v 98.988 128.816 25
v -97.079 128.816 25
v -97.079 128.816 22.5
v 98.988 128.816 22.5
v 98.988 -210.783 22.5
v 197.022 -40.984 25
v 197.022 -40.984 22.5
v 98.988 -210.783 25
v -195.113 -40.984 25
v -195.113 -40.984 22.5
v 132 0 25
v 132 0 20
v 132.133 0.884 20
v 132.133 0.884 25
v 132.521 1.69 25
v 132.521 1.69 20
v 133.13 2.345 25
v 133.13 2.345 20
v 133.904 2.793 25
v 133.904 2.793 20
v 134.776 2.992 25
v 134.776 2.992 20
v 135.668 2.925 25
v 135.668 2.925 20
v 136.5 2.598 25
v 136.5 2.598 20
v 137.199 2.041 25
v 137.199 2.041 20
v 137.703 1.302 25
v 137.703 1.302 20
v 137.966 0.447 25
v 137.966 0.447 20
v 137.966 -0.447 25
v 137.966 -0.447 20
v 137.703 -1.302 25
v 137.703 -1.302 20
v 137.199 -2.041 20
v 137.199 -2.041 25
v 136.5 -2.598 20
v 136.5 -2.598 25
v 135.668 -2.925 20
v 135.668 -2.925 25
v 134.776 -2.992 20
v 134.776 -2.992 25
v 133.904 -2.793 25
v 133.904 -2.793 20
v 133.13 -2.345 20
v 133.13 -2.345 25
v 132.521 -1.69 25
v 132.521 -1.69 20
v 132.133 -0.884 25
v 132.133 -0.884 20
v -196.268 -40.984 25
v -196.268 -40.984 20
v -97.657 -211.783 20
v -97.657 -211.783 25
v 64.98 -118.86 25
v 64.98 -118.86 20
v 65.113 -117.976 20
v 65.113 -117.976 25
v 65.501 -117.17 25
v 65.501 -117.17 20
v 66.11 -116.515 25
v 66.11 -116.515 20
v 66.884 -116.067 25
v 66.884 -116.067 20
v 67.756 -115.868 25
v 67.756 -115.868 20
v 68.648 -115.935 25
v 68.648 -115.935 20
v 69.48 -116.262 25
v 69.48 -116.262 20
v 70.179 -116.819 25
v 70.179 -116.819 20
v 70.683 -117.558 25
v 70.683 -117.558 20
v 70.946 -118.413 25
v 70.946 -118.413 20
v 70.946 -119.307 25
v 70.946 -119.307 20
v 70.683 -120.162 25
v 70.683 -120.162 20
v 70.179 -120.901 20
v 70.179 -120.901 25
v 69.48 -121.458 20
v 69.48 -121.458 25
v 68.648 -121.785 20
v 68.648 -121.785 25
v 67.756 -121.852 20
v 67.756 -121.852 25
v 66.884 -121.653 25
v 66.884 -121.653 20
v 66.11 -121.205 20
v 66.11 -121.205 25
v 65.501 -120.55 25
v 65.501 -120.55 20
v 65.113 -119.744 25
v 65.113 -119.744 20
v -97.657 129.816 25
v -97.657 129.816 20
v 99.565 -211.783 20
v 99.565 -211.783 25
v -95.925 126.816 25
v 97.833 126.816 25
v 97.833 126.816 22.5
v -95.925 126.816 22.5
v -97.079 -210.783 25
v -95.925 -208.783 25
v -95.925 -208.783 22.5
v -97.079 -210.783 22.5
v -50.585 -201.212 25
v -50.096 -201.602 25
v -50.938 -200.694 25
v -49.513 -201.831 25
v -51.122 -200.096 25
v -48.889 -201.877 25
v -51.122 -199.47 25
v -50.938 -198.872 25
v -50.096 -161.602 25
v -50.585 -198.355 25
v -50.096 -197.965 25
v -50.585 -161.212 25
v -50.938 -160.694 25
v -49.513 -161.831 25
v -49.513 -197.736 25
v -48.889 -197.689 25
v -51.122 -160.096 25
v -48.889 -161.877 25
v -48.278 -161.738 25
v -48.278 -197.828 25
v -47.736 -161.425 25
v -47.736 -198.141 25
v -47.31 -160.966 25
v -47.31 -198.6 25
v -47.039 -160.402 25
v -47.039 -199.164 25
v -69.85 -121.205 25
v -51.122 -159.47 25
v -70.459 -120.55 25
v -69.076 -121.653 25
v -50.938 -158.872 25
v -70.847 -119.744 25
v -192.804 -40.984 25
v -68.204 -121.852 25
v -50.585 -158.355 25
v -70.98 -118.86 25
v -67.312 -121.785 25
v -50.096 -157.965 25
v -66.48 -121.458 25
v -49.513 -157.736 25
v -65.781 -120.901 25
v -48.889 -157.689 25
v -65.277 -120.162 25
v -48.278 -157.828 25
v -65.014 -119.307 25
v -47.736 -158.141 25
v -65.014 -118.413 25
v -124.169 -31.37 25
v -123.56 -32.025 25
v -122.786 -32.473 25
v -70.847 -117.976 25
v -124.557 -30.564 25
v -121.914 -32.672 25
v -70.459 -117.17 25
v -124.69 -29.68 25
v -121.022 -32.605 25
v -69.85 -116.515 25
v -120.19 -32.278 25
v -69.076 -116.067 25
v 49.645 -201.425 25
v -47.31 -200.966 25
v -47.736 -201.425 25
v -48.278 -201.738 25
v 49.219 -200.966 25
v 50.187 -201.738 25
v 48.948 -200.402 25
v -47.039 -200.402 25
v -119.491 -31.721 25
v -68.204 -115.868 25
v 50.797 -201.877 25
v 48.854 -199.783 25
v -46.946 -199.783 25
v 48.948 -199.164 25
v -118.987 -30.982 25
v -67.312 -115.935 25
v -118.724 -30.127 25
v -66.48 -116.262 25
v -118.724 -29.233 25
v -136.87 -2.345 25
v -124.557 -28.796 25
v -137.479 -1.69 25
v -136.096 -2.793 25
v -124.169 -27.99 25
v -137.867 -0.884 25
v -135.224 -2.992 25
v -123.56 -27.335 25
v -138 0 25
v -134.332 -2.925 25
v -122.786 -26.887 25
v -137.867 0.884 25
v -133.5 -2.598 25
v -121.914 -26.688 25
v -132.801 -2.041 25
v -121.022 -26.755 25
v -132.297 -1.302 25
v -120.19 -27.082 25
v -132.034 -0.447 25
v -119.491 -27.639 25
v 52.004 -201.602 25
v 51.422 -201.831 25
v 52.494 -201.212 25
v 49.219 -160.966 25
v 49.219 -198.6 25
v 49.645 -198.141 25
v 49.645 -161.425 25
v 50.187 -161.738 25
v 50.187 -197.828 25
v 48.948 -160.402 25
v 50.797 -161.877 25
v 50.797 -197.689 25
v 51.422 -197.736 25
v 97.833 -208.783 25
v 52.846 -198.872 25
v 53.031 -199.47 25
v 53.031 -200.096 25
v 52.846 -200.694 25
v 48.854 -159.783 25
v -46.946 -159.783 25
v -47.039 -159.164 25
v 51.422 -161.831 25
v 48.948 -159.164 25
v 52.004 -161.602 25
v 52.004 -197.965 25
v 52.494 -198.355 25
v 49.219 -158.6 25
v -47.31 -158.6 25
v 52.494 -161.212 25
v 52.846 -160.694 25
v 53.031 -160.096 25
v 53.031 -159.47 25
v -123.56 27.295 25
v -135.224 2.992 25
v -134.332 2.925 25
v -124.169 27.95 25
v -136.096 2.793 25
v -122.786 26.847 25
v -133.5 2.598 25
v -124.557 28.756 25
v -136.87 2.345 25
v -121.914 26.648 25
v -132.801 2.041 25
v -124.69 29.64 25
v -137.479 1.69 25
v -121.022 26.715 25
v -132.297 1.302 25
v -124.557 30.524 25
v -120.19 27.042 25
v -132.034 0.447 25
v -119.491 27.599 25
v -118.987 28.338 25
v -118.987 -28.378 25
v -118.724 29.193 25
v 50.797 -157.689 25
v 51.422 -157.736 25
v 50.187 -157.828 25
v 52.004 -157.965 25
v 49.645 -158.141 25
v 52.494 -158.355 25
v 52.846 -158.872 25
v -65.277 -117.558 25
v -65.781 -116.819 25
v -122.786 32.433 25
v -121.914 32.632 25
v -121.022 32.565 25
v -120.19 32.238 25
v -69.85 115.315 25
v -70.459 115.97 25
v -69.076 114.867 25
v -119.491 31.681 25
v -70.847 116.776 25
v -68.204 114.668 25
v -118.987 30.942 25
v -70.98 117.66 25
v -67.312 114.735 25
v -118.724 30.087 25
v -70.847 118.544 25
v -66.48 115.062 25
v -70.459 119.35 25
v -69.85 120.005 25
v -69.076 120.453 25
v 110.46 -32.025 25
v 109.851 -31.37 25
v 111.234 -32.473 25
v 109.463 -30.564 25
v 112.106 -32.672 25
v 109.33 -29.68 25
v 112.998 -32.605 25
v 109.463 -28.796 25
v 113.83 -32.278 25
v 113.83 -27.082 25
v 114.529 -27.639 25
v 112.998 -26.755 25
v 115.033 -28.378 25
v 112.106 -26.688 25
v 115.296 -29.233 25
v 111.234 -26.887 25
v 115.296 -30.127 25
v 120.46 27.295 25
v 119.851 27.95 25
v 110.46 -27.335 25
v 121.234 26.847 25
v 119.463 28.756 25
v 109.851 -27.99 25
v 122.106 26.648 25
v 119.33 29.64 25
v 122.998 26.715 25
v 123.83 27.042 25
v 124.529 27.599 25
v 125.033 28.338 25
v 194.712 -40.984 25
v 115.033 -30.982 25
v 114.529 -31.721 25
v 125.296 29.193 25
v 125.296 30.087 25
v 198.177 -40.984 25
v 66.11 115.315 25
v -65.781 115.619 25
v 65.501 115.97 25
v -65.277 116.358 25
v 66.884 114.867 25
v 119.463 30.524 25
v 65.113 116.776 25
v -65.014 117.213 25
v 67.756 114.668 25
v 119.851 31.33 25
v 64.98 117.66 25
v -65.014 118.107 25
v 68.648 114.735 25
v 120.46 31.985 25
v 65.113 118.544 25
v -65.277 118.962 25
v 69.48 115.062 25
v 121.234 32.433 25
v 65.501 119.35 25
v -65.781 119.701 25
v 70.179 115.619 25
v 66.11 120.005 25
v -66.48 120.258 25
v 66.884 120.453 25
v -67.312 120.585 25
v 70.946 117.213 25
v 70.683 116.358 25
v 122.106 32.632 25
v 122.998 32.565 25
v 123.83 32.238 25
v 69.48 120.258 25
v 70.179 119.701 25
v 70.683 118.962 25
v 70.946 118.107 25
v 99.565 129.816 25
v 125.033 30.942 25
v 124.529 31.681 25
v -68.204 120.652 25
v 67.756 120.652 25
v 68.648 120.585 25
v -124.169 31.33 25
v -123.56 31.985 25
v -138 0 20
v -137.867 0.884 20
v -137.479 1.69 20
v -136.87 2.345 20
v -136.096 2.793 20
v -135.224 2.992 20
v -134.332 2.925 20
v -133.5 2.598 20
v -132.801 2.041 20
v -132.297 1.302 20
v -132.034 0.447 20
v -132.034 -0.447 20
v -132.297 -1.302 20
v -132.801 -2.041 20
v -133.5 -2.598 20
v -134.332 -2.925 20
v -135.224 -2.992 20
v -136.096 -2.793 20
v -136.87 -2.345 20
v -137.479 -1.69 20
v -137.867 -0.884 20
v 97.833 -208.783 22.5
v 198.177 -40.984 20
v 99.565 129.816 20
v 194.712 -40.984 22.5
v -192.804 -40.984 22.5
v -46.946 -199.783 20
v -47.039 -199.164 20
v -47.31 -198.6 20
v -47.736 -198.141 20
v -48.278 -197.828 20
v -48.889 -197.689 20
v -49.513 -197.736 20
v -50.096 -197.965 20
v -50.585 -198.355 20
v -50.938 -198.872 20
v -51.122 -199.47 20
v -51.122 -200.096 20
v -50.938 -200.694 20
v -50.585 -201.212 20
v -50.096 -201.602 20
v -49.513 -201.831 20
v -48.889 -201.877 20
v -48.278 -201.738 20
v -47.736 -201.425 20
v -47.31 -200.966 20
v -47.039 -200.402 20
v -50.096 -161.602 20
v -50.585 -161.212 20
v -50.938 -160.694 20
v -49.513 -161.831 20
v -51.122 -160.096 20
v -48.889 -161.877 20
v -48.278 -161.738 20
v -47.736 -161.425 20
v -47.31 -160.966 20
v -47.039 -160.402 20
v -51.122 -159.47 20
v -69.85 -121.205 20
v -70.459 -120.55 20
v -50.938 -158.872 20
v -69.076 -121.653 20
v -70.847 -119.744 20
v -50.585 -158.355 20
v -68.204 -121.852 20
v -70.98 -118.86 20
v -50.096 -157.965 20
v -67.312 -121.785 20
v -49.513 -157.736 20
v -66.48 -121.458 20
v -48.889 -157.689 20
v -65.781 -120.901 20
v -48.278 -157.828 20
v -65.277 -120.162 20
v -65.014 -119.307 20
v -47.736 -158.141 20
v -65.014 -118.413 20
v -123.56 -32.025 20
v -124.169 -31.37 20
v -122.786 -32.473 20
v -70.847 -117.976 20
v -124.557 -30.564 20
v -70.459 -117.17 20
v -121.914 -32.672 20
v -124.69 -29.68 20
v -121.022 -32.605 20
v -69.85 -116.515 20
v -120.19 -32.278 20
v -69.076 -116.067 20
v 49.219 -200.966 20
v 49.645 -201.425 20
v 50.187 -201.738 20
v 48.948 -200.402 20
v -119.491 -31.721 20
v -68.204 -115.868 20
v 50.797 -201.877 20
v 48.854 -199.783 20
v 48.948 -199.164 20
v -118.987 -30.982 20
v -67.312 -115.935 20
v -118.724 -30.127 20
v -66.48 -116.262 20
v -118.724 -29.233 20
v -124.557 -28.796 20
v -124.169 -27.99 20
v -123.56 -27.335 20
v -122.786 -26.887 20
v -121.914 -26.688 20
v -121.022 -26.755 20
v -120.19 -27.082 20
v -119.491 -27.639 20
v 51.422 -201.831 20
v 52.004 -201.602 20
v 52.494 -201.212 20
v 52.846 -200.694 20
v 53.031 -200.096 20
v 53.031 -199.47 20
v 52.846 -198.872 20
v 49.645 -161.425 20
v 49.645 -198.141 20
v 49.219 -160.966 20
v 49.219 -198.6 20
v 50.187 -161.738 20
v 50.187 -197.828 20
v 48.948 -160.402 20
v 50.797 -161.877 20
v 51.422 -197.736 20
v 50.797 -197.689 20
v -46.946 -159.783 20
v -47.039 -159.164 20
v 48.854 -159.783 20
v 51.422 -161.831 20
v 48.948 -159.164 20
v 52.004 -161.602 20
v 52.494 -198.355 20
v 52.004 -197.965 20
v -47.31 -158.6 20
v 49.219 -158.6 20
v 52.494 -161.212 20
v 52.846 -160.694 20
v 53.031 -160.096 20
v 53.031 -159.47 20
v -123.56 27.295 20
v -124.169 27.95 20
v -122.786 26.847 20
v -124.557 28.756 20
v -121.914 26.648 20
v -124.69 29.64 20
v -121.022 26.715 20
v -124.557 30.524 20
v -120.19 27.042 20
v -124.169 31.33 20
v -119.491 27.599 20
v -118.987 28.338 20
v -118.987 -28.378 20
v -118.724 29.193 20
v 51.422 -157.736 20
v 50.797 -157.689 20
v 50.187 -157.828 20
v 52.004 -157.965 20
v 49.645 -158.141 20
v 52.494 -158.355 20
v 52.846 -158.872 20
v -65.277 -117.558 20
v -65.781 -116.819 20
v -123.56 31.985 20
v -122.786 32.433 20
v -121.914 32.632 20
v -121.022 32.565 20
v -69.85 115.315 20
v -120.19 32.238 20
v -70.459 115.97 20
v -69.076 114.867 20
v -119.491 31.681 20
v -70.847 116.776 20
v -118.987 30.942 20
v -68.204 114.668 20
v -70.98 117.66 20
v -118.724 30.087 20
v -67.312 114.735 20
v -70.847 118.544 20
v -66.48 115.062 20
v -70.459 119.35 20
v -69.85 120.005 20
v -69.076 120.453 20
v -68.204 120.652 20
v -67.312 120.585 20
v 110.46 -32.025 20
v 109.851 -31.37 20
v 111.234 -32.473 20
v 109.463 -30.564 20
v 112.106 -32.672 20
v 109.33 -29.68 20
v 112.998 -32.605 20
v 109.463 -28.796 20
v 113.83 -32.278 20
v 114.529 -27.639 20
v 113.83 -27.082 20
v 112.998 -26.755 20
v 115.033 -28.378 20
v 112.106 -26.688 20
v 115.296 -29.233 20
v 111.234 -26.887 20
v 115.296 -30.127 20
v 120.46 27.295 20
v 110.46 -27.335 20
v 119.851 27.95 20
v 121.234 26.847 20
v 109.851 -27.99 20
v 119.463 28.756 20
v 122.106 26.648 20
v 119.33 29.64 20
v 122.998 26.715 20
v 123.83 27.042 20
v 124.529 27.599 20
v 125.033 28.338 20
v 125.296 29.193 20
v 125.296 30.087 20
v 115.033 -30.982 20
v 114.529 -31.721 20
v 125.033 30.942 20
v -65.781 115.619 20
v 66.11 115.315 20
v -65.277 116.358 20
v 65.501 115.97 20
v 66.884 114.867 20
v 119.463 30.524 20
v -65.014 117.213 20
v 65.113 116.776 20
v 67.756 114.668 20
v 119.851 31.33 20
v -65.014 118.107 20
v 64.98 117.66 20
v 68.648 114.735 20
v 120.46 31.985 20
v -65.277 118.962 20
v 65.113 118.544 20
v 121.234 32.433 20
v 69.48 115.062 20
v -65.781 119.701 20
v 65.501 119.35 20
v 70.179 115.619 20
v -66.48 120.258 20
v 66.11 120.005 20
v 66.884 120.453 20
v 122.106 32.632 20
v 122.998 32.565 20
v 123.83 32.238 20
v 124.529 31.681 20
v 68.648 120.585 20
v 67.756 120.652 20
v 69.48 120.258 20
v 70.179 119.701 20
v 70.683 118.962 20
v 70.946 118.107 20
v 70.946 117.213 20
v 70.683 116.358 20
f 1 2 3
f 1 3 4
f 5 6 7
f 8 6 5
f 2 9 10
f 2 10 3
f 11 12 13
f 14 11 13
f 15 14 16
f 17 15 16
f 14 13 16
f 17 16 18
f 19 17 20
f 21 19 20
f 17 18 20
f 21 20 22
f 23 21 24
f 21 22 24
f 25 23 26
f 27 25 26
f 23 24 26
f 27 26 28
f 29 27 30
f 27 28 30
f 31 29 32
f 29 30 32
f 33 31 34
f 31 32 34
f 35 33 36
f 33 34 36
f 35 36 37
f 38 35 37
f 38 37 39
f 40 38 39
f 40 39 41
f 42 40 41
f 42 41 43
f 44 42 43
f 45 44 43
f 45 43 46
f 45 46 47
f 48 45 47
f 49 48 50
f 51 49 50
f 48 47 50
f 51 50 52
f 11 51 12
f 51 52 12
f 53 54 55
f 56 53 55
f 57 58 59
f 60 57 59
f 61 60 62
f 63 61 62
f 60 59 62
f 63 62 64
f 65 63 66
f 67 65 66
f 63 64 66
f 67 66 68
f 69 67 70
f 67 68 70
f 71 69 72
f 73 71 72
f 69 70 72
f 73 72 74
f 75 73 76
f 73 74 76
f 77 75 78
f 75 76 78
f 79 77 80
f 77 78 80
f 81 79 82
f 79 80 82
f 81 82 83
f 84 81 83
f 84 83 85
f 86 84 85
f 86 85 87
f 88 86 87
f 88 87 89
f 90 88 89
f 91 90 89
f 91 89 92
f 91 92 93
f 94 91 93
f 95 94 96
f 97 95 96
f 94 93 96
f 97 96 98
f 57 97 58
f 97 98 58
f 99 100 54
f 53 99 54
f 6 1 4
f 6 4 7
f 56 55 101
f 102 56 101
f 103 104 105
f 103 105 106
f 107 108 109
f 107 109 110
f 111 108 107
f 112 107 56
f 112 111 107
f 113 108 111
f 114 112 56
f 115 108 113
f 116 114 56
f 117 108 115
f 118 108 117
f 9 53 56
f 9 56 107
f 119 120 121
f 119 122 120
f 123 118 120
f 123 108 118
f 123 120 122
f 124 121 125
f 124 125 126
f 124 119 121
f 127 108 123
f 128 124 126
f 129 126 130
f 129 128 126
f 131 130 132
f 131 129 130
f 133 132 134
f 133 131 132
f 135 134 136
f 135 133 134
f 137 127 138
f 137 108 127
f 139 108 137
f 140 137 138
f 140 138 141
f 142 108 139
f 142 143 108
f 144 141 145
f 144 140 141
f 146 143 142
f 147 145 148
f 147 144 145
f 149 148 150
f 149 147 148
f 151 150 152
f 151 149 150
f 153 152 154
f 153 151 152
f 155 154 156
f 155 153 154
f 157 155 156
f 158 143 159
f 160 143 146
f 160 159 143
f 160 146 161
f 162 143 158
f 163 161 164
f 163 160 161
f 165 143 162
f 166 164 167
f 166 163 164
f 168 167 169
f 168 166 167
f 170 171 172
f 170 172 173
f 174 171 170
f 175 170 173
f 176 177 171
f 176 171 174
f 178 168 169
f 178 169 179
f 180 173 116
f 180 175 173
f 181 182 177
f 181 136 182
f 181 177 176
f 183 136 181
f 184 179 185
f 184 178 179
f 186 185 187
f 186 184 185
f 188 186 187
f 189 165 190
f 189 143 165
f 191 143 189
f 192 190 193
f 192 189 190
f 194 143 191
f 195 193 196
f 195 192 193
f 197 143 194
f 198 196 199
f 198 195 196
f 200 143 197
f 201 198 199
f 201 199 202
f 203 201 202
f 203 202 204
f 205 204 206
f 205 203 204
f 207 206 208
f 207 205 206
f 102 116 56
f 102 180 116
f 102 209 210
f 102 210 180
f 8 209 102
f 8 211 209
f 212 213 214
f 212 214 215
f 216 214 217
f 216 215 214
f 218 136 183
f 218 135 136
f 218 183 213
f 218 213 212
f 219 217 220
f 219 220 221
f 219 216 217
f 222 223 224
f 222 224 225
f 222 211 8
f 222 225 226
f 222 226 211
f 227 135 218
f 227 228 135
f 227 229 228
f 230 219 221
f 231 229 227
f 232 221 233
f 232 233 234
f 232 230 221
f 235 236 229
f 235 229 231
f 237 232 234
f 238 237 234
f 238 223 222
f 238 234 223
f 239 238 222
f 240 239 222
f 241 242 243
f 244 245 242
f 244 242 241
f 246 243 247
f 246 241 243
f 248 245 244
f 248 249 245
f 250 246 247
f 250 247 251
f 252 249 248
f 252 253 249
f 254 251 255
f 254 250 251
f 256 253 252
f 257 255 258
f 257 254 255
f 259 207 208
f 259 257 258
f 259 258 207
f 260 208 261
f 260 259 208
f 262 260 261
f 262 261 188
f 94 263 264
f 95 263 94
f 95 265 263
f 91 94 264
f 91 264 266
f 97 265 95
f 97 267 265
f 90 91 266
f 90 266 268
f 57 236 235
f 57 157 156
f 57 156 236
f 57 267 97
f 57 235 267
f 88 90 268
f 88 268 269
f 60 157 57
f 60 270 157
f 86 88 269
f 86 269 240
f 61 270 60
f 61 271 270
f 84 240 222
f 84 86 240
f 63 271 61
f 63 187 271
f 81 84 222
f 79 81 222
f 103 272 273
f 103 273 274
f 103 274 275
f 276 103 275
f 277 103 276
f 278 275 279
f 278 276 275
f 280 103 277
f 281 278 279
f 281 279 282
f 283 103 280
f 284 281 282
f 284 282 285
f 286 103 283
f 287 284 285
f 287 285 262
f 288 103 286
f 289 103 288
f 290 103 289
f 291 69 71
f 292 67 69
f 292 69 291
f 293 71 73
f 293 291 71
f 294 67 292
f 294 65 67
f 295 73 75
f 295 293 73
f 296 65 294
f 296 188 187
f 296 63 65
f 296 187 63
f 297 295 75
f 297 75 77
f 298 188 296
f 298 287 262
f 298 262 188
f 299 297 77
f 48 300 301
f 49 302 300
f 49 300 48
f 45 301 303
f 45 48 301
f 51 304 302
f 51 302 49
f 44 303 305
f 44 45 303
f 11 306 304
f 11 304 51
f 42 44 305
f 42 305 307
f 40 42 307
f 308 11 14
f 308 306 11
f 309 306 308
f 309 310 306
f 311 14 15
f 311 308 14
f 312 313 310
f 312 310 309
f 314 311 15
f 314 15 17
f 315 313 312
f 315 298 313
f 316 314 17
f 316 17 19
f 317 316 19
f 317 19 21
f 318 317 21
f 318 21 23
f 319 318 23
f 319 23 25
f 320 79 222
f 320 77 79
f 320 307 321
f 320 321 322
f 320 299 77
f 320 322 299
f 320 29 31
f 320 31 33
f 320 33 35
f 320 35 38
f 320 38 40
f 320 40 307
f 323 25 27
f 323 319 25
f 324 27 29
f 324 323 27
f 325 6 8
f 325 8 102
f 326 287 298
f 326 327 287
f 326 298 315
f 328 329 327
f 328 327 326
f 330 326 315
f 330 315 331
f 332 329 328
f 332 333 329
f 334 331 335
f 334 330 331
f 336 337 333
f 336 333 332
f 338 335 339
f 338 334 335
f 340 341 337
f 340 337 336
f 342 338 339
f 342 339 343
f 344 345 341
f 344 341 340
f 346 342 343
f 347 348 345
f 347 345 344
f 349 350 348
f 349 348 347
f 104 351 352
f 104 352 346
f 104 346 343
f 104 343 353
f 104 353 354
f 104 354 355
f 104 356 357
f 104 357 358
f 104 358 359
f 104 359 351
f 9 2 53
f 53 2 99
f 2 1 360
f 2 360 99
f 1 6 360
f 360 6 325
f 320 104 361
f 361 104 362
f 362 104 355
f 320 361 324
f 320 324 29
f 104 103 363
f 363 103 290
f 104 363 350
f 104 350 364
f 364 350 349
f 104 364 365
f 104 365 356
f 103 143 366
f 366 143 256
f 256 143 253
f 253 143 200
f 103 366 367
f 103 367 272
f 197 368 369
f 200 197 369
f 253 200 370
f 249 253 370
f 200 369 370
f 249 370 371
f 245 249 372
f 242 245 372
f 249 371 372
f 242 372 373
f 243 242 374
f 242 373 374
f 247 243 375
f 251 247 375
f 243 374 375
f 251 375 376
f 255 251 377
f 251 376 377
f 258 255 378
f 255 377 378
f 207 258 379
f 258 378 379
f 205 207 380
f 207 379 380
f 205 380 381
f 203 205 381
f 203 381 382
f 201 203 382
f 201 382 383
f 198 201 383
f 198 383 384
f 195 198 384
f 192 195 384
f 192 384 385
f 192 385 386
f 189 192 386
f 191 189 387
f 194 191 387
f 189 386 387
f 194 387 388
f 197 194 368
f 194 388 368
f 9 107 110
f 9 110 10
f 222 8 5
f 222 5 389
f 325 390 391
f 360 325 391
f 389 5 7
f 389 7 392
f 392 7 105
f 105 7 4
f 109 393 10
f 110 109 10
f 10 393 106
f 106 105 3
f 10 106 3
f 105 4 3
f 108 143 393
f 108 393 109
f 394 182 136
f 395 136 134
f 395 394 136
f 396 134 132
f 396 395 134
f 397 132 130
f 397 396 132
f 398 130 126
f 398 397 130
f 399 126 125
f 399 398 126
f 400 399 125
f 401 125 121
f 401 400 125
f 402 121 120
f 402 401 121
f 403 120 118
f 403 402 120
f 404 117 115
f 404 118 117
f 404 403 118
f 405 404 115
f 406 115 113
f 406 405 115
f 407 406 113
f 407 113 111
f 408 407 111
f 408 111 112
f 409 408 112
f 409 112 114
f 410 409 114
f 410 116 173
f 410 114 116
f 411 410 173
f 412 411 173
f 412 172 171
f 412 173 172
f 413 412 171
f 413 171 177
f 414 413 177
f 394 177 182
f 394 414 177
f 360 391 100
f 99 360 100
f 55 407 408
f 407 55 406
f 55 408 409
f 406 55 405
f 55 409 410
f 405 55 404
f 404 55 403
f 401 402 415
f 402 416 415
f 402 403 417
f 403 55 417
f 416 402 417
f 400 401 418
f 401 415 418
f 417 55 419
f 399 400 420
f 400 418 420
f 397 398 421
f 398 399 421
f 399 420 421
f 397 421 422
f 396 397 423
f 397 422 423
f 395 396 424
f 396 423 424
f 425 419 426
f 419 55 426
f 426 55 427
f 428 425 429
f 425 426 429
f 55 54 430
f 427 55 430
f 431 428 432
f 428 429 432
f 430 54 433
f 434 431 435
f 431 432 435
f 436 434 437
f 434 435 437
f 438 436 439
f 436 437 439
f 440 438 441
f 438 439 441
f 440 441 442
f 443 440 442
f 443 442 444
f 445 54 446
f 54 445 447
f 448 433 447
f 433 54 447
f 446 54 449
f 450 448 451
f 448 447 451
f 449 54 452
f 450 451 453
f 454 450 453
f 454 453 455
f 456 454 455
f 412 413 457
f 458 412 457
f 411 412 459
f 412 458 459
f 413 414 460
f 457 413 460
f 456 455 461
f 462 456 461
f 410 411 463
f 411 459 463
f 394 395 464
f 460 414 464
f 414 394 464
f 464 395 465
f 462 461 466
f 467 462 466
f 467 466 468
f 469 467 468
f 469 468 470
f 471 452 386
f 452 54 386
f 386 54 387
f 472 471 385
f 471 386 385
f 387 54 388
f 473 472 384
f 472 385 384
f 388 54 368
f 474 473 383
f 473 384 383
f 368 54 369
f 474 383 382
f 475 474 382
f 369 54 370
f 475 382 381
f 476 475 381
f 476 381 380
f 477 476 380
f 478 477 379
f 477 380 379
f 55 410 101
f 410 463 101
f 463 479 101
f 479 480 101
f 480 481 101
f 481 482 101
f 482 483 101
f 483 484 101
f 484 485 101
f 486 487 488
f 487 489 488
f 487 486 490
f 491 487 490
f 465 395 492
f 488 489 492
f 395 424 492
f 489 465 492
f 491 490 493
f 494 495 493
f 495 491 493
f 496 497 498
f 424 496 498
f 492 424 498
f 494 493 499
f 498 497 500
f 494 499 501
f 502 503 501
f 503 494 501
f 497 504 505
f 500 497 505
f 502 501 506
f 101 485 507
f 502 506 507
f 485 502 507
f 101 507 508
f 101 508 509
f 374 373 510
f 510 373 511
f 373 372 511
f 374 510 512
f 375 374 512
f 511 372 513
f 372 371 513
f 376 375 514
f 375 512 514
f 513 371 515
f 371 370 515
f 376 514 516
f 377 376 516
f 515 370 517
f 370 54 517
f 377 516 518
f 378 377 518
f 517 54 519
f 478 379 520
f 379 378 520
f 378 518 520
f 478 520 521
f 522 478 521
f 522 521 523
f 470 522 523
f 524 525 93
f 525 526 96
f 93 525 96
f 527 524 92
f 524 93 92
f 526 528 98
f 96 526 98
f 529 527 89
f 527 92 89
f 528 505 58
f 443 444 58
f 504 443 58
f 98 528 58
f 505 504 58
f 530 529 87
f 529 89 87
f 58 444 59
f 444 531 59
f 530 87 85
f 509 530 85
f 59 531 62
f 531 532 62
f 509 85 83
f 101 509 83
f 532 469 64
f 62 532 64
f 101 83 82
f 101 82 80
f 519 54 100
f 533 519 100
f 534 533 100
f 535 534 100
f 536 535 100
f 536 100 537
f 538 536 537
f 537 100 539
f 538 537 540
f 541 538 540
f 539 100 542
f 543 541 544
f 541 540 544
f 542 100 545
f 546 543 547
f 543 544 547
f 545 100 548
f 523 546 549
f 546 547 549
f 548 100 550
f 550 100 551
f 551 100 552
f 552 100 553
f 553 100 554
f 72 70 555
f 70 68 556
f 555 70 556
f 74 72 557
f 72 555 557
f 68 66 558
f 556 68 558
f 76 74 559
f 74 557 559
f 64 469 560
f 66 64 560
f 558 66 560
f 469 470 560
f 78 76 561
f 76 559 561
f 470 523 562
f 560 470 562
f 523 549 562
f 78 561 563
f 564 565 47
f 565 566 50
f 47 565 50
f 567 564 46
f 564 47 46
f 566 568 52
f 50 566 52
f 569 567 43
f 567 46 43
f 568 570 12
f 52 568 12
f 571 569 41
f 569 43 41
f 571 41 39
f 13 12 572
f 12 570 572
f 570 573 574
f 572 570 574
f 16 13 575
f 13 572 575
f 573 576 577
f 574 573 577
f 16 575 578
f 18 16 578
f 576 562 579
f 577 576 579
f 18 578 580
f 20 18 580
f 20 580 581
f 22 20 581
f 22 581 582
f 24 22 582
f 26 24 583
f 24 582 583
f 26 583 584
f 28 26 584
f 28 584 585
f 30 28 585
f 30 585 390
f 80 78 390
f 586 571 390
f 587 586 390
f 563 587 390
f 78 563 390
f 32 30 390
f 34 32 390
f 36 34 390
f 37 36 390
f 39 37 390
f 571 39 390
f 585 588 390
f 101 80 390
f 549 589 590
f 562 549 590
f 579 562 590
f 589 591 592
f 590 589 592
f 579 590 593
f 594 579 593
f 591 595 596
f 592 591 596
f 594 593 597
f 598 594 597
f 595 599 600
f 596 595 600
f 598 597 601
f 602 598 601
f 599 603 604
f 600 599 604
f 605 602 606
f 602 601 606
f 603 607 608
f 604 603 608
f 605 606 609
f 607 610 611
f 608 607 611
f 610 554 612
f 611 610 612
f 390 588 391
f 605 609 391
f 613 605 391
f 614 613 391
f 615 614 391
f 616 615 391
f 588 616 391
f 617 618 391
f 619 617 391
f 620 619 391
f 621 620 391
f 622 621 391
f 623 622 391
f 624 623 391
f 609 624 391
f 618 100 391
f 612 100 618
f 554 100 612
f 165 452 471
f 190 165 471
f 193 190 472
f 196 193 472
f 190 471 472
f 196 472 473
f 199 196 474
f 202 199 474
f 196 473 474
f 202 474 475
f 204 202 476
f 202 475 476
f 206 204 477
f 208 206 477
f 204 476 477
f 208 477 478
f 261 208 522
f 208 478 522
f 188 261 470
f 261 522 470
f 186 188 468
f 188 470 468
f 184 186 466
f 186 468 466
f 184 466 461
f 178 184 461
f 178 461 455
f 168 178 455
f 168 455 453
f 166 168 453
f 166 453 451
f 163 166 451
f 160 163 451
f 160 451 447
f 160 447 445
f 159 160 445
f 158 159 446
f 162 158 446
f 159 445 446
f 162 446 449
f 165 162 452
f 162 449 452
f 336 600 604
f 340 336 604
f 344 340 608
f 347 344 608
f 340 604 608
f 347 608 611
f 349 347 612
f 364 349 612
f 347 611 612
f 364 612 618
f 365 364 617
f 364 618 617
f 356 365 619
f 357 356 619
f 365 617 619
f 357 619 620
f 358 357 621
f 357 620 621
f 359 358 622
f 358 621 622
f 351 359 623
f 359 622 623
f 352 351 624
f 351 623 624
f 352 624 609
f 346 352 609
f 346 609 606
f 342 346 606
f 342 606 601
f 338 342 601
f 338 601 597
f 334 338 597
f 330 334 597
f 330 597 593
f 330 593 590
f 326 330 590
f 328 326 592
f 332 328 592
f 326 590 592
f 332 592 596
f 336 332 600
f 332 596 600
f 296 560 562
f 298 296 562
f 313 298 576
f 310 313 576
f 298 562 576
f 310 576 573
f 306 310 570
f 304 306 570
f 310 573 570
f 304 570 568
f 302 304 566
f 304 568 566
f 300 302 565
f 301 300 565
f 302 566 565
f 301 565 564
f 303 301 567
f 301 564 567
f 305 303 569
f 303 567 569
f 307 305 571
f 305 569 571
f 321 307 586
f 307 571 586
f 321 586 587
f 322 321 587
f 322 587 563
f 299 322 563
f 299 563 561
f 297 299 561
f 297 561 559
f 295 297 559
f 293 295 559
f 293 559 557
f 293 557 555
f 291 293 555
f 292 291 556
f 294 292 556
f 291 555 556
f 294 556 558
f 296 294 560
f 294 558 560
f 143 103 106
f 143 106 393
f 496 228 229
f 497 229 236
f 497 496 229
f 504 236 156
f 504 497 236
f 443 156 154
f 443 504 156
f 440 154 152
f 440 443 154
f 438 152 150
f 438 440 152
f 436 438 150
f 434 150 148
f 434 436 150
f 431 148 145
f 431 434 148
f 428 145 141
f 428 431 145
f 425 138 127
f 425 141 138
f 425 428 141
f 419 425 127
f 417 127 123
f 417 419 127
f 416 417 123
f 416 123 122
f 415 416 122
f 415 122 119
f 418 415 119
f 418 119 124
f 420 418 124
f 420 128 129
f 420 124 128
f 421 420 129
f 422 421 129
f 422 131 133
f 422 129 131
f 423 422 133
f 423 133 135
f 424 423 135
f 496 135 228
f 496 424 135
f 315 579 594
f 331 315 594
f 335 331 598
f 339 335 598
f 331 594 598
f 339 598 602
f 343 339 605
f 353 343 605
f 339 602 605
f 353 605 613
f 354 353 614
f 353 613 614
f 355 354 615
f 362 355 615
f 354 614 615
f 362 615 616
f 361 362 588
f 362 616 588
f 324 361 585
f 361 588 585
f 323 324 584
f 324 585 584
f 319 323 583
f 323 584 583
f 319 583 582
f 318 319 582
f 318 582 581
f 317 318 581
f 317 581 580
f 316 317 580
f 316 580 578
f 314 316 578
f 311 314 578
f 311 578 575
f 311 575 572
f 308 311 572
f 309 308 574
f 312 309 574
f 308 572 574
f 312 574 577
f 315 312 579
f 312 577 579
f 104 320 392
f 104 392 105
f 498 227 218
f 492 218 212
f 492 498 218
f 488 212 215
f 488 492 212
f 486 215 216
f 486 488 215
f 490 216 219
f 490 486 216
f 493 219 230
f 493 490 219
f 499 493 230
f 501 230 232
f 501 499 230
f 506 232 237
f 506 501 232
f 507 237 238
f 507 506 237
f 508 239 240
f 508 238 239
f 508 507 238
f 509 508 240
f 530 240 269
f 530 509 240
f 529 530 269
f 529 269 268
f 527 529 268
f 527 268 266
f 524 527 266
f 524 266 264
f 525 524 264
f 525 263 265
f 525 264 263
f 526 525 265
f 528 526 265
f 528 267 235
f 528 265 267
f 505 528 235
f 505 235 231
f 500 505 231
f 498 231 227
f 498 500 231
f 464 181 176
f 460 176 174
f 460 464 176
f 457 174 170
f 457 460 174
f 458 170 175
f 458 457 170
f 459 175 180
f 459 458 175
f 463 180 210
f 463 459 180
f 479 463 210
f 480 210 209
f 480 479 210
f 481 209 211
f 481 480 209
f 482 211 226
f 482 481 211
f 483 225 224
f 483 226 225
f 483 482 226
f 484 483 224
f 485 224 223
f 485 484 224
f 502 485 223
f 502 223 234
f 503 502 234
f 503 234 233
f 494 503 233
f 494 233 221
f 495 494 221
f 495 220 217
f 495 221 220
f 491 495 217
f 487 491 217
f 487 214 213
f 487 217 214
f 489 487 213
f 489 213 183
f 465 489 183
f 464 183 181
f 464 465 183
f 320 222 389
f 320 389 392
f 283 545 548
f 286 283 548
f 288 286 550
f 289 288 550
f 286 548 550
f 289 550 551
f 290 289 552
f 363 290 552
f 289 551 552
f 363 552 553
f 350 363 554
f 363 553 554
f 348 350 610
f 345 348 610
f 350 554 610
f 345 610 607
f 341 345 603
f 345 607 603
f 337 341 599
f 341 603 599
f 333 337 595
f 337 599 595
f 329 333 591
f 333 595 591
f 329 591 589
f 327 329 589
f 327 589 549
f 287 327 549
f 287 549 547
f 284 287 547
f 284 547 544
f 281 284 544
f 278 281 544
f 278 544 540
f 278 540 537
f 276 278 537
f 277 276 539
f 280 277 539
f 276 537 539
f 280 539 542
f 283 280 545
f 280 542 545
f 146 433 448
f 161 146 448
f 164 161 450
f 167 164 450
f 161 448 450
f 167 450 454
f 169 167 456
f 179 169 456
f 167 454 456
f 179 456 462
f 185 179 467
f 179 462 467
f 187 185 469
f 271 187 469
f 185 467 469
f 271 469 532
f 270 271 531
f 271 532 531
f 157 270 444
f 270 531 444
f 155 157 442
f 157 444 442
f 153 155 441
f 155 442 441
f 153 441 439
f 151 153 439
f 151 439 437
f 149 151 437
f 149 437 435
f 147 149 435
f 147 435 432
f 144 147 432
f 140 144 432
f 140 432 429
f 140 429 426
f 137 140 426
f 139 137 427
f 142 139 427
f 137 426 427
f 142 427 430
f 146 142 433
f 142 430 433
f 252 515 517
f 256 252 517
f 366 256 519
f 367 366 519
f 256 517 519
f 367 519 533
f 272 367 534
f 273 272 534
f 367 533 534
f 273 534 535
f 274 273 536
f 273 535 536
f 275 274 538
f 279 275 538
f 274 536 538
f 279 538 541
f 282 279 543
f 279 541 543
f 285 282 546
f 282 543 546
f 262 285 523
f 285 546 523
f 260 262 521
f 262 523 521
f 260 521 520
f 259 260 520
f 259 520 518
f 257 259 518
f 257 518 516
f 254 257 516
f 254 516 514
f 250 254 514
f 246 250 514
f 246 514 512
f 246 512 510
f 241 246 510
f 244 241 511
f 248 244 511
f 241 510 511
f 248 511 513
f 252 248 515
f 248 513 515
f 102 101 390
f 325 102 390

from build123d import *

# Parameters (mm, degrees)
EXTRUDE_9_DEPTH      = 5
CUT_EXTRUDE_7_DEPTH  = 2.5
SKETCH_53_R          = 3
CUT_EXTRUDE_12_DEPTH = 5
SKETCH_54_R          = 2.1
CUT_EXTRUDE_14_DEPTH = 291.088033153


with BuildPart() as part:
    # 草图51 → 凸台-拉伸9 (new body)
    with BuildSketch(Plane.XY.offset(20)):
        Polygon((198.176593222, -40.983726982), (99.565497293, 129.815701356), (-97.656694564, 129.815701356), (-196.267790492, -40.983726982), (-97.656694564, -211.78315532), (99.565497293, -211.78315532), align=None)
    extrude(amount=EXTRUDE_9_DEPTH)

    # 草图52 → 切除-拉伸7 (cut)
    with BuildSketch(Plane.XY.offset(25)):
        Polygon((-195.113089954, -40.983726982), (-97.079344294, 128.815701356), (98.988147024, 128.815701356), (197.021892683, -40.983726982), (98.988147024, -210.78315532), (97.833446486, -208.78315532), (194.712491607, -40.983726982), (97.833446486, 126.815701356), (-95.924643756, 126.815701356), (-192.803688877, -40.983726982), (-95.924643756, -208.78315532), (-97.079344294, -210.78315532), align=None)
    extrude(amount=-CUT_EXTRUDE_7_DEPTH, mode=Mode.SUBTRACT)

    # 草图53 → 切除-拉伸12 (cut)
    with BuildSketch(Plane(origin=(0, 0, 20), x_dir=(-1, 0, 0), z_dir=(0, 0, -1))):
        with Locations((-67.98, -118.86)):
            Circle(SKETCH_53_R)
        with Locations((-67.98, 117.66)):
            Circle(SKETCH_53_R)
        with Locations((67.98, 117.66)):
            Circle(SKETCH_53_R)
        with Locations((-112.33, -29.68)):
            Circle(SKETCH_53_R)
        with Locations((121.69, -29.68)):
            Circle(SKETCH_53_R)
        with Locations((-135, 0)):
            Circle(SKETCH_53_R)
        with Locations((135, 0)):
            Circle(SKETCH_53_R)
        with Locations((-122.33, 29.64)):
            Circle(SKETCH_53_R)
        with Locations((121.69, 29.64)):
            Circle(SKETCH_53_R)
        with Locations((67.98, -118.86)):
            Circle(SKETCH_53_R)
    extrude(amount=-CUT_EXTRUDE_12_DEPTH, mode=Mode.SUBTRACT)

    # 草图54 → 切除-拉伸14 (cut, through all)
    with BuildSketch(Plane.XY.offset(20)):
        with Locations((-49.045598635, -199.78315532)):
            Circle(SKETCH_54_R)
        with Locations(Location((50.954401365, -199.78315532, 0), (0, 0, 180))):
            Circle(SKETCH_54_R)
        with Locations((-49.045598635, -159.78315532)):
            Circle(SKETCH_54_R)
        with Locations(Location((50.954401365, -159.78315532, 0), (0, 0, 180))):
            Circle(SKETCH_54_R)
    extrude(amount=CUT_EXTRUDE_14_DEPTH, mode=Mode.SUBTRACT)


solid = part.part
